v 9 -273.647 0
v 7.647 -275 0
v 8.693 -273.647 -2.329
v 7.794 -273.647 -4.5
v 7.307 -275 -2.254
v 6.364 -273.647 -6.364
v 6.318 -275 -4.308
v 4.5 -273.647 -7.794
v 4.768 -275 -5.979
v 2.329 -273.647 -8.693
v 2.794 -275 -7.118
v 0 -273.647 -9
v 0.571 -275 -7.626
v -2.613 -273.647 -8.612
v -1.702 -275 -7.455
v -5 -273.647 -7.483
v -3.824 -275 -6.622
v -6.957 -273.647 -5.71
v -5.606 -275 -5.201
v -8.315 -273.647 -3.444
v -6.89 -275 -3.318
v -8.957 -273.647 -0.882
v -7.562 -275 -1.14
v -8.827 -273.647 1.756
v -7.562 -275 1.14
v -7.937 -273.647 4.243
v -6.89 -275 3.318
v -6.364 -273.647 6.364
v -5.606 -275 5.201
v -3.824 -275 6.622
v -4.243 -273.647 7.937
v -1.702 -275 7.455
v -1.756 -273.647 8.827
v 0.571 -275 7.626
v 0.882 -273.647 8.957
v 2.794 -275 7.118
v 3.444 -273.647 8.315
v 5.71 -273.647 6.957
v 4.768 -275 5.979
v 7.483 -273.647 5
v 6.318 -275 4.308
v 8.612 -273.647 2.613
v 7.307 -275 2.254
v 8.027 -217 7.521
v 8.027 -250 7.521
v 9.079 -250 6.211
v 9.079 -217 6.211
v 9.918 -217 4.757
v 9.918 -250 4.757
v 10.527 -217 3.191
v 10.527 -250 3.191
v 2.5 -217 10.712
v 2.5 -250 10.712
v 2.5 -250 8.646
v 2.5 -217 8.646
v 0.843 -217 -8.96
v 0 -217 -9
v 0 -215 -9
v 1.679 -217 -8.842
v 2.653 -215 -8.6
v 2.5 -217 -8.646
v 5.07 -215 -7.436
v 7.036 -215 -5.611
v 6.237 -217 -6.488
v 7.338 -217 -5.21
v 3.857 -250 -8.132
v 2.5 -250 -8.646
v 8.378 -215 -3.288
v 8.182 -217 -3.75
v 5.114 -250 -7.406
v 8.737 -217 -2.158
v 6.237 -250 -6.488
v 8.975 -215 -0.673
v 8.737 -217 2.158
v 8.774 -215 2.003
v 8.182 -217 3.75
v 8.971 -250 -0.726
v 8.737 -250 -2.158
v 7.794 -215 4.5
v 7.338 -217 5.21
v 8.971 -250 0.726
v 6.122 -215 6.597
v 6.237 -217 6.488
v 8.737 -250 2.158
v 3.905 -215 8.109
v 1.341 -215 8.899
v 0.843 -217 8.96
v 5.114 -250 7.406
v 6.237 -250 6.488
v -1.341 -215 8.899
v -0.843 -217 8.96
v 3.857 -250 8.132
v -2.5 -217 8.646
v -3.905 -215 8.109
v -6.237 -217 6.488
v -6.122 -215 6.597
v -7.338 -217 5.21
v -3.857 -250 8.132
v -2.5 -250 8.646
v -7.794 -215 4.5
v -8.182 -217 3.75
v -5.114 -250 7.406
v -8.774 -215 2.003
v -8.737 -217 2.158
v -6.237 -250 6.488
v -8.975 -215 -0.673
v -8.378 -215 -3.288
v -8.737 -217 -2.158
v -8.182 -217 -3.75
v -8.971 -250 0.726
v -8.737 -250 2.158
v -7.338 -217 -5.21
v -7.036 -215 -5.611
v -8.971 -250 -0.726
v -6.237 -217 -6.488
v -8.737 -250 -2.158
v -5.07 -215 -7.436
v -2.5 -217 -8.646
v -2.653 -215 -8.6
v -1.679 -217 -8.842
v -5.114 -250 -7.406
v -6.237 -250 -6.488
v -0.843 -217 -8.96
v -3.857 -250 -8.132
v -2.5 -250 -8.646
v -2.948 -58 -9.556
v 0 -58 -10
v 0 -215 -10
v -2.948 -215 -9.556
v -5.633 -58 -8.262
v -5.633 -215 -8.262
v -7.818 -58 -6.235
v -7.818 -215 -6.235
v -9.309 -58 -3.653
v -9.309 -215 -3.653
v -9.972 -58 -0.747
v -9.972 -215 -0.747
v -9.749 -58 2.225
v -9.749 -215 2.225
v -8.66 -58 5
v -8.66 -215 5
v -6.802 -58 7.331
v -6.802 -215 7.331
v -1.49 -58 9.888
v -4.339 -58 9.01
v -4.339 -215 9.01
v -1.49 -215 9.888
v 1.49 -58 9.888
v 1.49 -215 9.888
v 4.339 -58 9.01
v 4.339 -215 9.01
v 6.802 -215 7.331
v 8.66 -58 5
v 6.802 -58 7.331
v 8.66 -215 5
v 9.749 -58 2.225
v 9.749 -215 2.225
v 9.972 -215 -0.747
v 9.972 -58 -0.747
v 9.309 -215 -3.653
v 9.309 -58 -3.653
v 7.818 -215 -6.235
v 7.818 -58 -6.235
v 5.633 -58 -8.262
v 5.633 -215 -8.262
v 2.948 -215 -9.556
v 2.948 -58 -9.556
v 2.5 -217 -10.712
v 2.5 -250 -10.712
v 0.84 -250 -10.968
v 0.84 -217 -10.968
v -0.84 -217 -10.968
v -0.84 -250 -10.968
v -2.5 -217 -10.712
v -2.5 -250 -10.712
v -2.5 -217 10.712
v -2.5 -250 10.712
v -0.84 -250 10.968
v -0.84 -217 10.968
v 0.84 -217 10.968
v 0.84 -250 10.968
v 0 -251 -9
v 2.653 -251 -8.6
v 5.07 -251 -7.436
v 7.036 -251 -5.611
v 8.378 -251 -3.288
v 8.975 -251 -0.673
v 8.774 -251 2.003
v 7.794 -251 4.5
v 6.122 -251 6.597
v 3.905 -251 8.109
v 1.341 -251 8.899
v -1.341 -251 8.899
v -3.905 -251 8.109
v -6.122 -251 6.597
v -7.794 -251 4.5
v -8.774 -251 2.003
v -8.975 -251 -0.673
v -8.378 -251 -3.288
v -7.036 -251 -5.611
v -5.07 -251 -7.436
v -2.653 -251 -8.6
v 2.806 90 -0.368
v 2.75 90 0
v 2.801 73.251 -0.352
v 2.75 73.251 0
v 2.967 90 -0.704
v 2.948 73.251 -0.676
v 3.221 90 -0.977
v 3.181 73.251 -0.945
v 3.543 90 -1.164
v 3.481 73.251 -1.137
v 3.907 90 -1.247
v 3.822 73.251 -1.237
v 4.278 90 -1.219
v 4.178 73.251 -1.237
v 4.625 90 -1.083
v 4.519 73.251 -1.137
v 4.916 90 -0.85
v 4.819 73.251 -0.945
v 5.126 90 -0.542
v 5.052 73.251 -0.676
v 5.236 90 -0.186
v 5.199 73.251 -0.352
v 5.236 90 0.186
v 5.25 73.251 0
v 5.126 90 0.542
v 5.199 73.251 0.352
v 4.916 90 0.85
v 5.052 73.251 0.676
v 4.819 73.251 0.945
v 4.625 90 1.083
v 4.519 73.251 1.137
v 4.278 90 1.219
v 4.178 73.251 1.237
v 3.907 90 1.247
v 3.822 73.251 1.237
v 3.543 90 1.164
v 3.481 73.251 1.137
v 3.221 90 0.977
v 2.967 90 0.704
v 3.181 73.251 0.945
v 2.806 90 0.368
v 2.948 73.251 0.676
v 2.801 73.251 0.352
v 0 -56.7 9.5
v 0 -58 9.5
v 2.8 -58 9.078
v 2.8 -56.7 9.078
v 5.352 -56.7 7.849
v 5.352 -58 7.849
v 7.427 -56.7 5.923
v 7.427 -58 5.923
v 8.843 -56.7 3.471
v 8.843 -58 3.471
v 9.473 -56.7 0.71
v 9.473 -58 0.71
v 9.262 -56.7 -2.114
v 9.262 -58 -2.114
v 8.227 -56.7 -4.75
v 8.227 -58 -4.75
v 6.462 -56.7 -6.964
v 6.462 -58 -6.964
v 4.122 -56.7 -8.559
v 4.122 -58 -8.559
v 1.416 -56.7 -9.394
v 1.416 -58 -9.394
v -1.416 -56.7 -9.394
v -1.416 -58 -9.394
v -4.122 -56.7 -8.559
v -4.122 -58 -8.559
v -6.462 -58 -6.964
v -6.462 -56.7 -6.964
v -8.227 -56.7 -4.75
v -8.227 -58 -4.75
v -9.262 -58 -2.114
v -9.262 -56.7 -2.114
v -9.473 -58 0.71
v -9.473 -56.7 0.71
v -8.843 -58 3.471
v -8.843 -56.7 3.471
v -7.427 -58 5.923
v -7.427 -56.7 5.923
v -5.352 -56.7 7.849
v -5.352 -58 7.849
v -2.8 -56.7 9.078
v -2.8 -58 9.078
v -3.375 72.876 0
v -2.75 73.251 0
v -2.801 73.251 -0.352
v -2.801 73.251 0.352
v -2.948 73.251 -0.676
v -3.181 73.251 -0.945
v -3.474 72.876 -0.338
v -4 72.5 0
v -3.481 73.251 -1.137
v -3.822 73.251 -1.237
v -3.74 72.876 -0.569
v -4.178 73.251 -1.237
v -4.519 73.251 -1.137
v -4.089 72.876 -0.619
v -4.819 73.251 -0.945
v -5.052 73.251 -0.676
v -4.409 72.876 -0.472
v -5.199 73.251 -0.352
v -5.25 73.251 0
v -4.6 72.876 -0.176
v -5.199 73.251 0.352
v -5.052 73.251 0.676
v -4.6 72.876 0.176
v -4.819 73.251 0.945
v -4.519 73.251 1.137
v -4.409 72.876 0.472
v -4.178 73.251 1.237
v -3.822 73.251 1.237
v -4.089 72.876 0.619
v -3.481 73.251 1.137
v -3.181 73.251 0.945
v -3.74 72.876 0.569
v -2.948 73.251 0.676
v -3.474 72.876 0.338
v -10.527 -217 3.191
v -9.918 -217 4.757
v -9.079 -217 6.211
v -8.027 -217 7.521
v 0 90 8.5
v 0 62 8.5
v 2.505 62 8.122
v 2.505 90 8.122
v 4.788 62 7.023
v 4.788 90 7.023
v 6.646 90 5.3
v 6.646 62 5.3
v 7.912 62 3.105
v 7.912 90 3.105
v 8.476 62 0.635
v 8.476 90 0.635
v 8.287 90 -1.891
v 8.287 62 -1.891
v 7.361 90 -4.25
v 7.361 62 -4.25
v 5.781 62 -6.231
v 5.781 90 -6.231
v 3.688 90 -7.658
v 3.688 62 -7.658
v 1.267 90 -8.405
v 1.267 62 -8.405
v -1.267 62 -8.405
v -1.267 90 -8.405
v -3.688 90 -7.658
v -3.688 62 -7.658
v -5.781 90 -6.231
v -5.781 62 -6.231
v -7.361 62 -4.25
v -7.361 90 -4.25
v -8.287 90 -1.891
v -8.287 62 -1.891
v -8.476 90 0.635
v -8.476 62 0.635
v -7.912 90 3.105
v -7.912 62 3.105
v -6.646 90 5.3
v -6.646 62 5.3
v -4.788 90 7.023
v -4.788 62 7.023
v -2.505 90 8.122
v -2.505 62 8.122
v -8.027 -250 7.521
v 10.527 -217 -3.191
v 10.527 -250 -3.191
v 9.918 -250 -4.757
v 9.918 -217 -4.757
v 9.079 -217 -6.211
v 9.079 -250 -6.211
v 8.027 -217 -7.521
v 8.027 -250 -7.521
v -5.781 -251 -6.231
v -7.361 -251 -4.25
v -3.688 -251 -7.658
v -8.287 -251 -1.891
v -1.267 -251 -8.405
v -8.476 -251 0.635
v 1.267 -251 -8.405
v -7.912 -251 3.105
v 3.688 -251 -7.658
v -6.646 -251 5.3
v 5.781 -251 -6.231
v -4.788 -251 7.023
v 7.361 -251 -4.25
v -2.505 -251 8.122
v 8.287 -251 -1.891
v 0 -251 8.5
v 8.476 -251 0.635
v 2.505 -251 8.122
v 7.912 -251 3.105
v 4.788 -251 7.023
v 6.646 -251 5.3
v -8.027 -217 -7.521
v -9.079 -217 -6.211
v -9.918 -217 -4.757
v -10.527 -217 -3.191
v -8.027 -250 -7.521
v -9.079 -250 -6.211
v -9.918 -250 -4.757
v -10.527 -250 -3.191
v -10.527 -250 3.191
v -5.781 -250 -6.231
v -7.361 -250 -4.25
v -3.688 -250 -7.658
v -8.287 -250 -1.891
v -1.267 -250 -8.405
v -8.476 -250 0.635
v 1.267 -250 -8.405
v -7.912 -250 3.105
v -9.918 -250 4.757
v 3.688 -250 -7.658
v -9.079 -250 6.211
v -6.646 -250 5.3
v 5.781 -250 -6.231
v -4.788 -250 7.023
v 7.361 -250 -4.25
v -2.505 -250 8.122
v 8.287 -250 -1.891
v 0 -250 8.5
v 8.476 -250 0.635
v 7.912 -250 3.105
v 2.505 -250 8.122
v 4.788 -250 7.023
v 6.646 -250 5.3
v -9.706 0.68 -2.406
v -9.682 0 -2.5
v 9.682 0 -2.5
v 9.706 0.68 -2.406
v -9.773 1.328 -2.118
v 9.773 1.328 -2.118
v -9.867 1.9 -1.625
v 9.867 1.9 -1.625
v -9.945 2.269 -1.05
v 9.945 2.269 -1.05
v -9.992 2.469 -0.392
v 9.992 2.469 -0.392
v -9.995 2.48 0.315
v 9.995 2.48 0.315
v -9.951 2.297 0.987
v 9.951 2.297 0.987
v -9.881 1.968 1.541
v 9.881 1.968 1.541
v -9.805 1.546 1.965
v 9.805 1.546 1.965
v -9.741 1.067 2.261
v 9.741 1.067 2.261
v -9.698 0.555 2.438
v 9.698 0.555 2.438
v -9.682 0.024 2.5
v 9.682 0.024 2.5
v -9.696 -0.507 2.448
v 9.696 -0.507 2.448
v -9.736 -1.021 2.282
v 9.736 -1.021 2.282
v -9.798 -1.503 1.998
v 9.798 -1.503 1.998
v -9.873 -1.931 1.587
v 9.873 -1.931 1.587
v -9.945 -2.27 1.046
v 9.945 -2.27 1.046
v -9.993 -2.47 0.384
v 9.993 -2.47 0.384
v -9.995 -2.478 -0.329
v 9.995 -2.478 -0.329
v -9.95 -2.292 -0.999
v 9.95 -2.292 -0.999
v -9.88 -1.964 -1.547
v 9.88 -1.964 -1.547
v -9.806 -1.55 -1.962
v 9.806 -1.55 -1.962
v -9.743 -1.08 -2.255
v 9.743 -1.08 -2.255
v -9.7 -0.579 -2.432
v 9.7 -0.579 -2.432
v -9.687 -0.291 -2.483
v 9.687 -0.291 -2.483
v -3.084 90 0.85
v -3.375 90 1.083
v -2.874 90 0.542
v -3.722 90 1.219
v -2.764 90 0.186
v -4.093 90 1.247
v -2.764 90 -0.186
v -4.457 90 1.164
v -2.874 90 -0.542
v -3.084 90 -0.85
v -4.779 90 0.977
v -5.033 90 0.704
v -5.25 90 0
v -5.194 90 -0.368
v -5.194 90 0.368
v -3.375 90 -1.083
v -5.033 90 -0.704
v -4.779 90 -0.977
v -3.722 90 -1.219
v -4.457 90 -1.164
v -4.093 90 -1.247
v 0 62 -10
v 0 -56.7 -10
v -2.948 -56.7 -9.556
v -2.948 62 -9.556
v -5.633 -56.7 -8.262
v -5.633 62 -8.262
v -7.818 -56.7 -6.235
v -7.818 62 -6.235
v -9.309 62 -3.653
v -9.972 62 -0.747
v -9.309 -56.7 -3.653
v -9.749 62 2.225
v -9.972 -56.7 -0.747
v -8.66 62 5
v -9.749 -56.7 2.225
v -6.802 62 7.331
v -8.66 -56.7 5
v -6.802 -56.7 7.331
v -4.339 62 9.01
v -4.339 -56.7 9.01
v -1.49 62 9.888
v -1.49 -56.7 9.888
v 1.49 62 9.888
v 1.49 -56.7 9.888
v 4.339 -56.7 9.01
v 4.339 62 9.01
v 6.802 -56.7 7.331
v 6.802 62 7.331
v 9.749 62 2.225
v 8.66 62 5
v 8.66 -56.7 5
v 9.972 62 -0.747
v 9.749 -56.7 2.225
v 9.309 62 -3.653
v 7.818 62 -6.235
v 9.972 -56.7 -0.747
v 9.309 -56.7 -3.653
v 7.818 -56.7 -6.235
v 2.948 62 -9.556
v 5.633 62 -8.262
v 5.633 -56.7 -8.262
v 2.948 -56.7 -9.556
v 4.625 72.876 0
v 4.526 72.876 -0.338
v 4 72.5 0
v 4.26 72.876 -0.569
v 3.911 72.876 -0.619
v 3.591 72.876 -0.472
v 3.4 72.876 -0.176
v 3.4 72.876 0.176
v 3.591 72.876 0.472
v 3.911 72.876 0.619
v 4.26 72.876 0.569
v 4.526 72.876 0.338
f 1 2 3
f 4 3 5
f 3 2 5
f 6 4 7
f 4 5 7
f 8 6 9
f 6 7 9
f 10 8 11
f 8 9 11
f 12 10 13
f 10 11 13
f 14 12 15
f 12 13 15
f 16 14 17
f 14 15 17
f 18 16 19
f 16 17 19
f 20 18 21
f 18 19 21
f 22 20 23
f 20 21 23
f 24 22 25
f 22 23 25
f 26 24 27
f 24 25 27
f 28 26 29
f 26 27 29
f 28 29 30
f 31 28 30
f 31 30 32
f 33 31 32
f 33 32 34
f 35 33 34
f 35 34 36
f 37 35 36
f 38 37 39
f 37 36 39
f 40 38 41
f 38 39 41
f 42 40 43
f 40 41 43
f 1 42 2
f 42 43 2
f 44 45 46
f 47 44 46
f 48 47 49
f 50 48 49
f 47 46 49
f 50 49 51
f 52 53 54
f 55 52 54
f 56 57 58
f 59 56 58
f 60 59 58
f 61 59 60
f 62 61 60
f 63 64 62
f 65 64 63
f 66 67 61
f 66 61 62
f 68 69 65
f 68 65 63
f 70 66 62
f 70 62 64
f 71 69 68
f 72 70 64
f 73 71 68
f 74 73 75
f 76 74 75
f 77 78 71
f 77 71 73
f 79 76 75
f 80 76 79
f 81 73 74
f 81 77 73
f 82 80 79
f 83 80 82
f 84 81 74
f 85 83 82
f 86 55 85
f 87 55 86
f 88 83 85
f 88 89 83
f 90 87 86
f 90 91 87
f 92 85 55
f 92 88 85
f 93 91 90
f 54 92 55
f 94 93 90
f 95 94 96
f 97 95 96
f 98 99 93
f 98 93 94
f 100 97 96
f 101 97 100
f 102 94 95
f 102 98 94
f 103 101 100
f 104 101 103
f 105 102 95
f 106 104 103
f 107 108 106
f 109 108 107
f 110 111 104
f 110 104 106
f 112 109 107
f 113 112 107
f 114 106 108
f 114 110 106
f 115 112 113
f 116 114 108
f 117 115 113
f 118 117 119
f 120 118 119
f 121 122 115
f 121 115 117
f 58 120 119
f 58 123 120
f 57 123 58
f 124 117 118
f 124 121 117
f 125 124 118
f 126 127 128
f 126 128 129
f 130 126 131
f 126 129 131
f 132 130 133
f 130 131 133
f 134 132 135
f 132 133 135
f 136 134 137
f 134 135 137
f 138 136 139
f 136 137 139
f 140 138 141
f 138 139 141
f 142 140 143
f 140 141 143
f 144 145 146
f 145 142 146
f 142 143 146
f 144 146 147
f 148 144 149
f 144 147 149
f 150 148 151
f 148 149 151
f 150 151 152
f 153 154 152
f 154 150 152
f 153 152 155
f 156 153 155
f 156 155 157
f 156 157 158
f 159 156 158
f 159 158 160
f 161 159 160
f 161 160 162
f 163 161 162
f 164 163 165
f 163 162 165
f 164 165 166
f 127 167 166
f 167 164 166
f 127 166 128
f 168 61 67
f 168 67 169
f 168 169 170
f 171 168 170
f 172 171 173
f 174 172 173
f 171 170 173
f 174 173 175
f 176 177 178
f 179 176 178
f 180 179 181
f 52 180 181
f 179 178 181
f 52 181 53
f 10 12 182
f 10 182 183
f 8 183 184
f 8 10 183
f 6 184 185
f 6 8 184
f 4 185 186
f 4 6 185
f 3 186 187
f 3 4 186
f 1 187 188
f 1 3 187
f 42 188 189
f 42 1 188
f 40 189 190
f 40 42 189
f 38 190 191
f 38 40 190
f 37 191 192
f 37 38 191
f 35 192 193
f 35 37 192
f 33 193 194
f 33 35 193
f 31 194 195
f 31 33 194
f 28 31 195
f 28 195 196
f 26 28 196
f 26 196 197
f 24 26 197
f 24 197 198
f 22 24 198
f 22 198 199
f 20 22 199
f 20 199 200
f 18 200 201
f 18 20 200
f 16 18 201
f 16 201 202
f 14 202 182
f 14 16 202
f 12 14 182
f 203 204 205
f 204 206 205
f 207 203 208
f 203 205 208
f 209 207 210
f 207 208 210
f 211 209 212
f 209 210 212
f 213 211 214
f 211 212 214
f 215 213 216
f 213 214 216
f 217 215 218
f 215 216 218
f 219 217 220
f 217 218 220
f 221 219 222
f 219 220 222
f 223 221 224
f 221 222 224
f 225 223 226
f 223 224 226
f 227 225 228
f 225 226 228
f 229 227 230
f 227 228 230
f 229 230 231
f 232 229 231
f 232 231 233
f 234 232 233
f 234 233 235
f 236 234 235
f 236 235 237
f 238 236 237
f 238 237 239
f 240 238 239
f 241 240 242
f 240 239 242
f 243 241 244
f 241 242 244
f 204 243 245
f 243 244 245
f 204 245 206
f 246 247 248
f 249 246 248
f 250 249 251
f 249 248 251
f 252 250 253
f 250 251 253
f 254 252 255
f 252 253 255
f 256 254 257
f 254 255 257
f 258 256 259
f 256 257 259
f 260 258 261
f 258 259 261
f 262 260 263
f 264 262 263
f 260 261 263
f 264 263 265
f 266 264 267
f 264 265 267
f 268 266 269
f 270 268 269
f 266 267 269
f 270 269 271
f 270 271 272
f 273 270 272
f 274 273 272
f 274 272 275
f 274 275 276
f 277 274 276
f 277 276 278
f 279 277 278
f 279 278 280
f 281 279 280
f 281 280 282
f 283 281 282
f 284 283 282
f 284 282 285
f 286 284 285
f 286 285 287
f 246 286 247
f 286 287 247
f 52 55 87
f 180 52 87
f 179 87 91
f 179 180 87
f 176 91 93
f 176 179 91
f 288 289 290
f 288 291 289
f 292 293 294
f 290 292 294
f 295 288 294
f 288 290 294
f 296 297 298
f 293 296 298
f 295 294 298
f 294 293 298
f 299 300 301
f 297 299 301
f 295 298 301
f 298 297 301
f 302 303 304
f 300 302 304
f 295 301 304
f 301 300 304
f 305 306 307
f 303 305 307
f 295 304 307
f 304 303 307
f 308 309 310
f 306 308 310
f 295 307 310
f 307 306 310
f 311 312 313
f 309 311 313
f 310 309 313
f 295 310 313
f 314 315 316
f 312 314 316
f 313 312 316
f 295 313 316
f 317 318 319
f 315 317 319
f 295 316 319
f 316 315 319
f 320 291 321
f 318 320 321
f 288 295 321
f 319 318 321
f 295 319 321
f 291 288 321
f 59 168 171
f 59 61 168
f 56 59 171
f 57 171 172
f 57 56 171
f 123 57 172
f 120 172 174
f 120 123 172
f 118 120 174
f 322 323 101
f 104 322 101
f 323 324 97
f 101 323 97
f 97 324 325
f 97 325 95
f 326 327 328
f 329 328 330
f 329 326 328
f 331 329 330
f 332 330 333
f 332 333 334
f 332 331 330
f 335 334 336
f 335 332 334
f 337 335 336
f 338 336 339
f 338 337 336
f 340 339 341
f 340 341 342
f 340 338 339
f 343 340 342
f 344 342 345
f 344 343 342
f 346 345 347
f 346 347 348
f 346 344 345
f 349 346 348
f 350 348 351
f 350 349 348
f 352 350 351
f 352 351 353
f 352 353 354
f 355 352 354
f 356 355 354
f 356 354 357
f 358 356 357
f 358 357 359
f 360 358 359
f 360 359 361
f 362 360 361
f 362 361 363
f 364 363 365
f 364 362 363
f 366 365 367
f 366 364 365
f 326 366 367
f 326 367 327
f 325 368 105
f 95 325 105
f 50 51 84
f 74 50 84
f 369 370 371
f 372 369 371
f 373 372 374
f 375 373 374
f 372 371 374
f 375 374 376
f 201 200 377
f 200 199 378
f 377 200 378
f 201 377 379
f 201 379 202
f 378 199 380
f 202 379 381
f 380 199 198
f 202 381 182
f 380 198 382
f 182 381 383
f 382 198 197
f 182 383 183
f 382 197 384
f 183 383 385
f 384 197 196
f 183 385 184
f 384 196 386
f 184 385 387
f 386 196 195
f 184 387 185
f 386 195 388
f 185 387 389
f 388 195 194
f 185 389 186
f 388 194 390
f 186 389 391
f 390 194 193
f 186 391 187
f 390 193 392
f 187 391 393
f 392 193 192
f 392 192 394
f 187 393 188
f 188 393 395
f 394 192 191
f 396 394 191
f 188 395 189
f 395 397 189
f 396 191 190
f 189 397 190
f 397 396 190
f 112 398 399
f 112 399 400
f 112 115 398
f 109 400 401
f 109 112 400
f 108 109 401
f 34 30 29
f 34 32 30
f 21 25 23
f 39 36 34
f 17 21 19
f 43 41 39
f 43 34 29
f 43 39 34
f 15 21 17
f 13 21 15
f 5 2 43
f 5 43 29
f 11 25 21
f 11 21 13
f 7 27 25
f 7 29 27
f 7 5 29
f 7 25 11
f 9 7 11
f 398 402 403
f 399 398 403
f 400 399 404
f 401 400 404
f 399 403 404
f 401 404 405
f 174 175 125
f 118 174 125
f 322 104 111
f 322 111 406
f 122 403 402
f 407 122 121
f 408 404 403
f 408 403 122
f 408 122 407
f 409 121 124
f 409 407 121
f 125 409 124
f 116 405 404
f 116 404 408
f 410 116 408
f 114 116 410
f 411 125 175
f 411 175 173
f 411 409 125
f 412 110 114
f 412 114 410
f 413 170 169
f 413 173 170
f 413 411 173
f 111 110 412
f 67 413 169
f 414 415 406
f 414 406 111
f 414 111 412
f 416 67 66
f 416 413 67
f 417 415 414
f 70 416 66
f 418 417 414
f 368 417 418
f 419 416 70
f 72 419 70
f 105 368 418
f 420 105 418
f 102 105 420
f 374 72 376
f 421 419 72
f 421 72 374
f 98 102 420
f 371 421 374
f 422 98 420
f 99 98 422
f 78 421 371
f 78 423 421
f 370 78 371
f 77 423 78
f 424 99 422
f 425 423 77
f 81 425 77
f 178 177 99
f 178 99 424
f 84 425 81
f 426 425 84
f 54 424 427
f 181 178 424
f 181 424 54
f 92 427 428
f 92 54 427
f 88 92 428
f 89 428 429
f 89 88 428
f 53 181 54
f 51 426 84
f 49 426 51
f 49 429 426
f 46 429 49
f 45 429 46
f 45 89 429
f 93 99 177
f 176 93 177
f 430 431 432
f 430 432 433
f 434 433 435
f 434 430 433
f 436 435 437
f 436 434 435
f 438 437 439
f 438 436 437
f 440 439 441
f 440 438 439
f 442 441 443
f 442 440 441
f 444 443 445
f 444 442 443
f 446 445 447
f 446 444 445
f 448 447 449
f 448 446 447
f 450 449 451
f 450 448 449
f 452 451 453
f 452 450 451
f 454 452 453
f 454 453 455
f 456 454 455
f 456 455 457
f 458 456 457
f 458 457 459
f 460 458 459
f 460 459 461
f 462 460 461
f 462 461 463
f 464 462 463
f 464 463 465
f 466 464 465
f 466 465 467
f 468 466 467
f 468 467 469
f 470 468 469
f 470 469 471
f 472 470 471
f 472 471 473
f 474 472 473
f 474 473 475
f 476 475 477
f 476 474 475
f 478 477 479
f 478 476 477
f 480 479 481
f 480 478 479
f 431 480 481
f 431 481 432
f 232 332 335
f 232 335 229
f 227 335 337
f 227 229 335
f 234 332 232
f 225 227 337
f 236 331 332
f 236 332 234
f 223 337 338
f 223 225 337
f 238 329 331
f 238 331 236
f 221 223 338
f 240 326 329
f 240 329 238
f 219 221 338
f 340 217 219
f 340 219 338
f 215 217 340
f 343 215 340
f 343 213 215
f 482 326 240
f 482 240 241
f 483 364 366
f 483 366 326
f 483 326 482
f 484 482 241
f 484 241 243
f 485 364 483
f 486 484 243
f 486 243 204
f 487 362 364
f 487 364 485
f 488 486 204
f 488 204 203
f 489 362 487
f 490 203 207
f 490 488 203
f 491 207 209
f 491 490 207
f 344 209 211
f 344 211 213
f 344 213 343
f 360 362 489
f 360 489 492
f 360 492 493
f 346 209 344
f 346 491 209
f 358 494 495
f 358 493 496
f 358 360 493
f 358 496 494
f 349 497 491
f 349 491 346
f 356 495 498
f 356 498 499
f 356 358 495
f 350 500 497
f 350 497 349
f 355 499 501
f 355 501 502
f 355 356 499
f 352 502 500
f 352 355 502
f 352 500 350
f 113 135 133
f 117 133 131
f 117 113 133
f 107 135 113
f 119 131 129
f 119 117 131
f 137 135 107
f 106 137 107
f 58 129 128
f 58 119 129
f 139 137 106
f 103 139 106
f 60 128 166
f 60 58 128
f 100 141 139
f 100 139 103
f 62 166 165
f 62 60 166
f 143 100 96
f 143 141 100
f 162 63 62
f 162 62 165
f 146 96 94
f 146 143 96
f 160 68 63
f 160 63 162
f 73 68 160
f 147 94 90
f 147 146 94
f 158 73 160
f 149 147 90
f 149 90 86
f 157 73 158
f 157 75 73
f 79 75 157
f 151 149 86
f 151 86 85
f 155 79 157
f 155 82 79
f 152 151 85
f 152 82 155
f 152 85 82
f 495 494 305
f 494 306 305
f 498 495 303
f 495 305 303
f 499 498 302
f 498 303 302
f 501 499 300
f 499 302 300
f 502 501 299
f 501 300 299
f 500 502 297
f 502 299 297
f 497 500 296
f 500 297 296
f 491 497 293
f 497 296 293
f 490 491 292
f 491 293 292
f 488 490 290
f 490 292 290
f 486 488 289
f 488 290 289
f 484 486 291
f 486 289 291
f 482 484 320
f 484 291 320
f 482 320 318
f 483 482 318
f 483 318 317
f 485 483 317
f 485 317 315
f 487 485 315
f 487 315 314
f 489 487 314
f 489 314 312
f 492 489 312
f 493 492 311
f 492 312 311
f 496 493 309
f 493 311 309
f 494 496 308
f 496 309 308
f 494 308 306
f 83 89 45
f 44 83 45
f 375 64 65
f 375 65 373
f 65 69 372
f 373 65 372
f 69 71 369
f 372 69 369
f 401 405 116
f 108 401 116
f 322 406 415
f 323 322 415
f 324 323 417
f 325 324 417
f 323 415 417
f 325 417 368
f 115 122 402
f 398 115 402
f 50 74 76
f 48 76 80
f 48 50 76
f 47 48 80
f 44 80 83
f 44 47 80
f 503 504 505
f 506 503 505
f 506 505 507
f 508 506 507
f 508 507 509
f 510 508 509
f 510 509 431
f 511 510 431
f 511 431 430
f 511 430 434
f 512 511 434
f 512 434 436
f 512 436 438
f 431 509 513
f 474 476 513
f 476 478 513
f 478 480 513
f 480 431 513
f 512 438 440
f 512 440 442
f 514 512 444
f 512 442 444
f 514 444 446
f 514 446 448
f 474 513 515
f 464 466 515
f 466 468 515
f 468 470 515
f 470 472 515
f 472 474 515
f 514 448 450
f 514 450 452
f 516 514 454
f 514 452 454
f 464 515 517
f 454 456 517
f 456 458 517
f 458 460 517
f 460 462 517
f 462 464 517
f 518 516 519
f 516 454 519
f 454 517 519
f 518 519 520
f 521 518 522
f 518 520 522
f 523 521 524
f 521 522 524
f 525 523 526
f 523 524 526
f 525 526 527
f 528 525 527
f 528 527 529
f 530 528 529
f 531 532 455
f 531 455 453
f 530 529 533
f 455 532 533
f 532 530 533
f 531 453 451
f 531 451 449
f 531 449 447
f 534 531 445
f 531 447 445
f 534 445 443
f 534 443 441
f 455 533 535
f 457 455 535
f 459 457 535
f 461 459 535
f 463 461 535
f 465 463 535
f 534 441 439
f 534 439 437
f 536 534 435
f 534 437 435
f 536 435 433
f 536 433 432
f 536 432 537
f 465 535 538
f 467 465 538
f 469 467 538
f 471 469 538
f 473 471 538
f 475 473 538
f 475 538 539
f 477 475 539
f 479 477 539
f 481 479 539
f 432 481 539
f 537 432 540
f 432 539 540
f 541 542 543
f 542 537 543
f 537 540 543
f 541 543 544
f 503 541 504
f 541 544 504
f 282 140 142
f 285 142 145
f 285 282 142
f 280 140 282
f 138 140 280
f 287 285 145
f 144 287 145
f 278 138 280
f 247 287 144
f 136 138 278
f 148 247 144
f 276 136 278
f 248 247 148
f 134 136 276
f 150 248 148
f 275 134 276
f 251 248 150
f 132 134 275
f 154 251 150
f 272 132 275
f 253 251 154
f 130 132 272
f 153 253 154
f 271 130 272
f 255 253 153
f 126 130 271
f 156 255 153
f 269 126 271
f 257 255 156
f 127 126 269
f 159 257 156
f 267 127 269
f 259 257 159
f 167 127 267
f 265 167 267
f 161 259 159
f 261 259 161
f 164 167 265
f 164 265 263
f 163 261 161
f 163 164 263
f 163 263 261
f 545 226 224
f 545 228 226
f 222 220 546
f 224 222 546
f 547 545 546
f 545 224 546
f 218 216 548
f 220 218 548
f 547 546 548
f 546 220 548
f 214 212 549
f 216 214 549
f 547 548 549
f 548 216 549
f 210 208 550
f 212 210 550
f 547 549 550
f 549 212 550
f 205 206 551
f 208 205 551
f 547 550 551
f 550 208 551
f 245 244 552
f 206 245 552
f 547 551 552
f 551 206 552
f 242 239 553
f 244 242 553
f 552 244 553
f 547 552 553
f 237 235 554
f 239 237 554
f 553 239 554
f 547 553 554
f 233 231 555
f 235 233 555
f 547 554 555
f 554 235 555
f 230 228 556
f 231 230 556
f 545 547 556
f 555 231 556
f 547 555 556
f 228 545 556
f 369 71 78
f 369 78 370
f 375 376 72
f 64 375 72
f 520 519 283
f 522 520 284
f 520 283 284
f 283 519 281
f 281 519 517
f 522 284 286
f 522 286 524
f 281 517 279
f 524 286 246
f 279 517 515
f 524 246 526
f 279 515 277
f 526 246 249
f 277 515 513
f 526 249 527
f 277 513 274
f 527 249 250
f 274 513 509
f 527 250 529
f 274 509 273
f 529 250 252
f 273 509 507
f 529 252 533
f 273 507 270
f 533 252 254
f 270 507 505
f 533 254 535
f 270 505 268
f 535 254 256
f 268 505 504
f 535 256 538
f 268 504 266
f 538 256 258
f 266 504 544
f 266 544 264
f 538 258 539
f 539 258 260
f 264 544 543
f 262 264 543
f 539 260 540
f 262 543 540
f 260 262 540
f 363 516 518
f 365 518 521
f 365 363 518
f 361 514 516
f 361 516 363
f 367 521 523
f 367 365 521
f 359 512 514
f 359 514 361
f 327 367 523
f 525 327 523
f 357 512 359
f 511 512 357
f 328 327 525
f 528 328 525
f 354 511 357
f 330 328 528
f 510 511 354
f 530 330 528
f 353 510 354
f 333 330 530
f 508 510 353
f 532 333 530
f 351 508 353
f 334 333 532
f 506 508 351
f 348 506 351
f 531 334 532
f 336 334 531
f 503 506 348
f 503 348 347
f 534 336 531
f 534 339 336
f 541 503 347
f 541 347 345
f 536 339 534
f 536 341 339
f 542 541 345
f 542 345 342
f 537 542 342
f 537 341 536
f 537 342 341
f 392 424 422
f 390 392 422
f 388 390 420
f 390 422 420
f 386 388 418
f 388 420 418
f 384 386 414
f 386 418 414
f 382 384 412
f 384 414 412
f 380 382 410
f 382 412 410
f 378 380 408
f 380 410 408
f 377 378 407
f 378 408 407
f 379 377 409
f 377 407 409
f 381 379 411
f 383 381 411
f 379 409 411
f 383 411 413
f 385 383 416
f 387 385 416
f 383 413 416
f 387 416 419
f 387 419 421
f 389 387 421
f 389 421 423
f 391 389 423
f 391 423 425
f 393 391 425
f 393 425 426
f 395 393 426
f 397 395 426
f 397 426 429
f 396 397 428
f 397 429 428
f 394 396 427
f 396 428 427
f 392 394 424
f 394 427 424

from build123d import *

# Parameters (mm, degrees)
EXTRUDE_1_DEPTH          = 90
EXTRUDE_1_DEPTH_BACK     = 250
SKETCH_1_R               = 10
CUT_EXTRUDE_1_DEPTH      = 251.399680511
CUT_EXTRUDE_1_DEPTH_BACK = 251.399680511
SKETCH_2_R               = 2.5
CHAMFER_1_SIZE           = 1
CUT_EXTRUDE_START        = -58
SKETCH_3_OUTSIDE_W       = 90.234
SKETCH_3_OUTSIDE_H       = 90.234
SKETCH_3_OUTSIDE_R       = 9.5
CUT_EXTRUDE_2_DEPTH      = 1.3
SKETCH_4_OUTSIDE_W       = 90.234
SKETCH_4_OUTSIDE_H       = 90.234
SKETCH_4_OUTSIDE_R       = 8.5
CUT_EXTRUDE_3_DEPTH      = 28
HOLE_WIZARD_M3_1_D       = 2.5
HOLE_WIZARD_M3_1_DEPTH   = 16.748924226
HOLE_WIZARD_M3_1_TIP     = 0.751075774
SKETCH_12_OUTSIDE_W      = 90.234
SKETCH_12_OUTSIDE_H      = 90.234
SKETCH_12_OUTSIDE_R      = 9
CUT_EXTRUDE_4_DEPTH      = 33
EXTRUDE_2_DEPTH          = 33
PATTERN_CIRCULAR_1_COUNT = 6
SKETCH_14_OUTSIDE_W      = 91.326
SKETCH_14_OUTSIDE_H      = 92.272
SKETCH_14_OUTSIDE_R      = 9
CUT_EXTRUDE_5_DEPTH      = 2
EXTRUDE_START            = 25
SKETCH_15_R              = 9
EXTRUDE_3_DEPTH          = 25
CUT_EXTRUDE_START_2      = -25
SKETCH_16_OUTSIDE_W      = 96.308
SKETCH_16_OUTSIDE_H      = 97.254
SKETCH_16_OUTSIDE_R      = 8.5
CUT_EXTRUDE_6_DEPTH      = 1


# Read off the part's stored shape, not the designer's step: M18 机械螺纹 螺柱1
with BuildPart() as part:
    # 草图1 → 凸台-拉伸1 (new, two sides: drawn at the far end of the back side and taken through both)
    with BuildSketch(Plane(origin=(0, 0, 0), x_dir=(1, 0, 0), z_dir=(0, 1, 0)).offset(-EXTRUDE_1_DEPTH_BACK)):
        with Locations(Location((0, 0, 0), (0, 0, 90))):
            Circle(SKETCH_1_R)
    extrude(amount=EXTRUDE_1_DEPTH + EXTRUDE_1_DEPTH_BACK)

    # 草图2 → 切除-拉伸1 (cut, two sides: drawn at the far end of the back side and taken through both)
    with BuildSketch(Plane(origin=(0, 0, 0), x_dir=(0, 0, -1), z_dir=(1, 0, 0)).offset(-CUT_EXTRUDE_1_DEPTH_BACK)):
        Circle(SKETCH_2_R)
    extrude(amount=CUT_EXTRUDE_1_DEPTH + CUT_EXTRUDE_1_DEPTH_BACK, mode=Mode.SUBTRACT)

    # 倒角1
    chamfer_1_edges = [part.edges().sort_by_distance(p)[0] for p in [
        (0, 90, 10),
    ]]
    chamfer(chamfer_1_edges, length=CHAMFER_1_SIZE)

    # 草图3 outside → 切除-拉伸2 (cut)
    with BuildSketch(Plane(origin=(0, 0, 0), x_dir=(1, 0, 0), z_dir=(0, 1, 0)).offset(CUT_EXTRUDE_START)):
        Rectangle(SKETCH_3_OUTSIDE_W, SKETCH_3_OUTSIDE_H)
        with Locations(Location((0, 0, 0), (0, 0, 270))):
            Circle(SKETCH_3_OUTSIDE_R, mode=Mode.SUBTRACT)
    extrude(amount=CUT_EXTRUDE_2_DEPTH, mode=Mode.SUBTRACT)

    # 草图4 outside → 切除-拉伸3 (cut)
    with BuildSketch(Plane(origin=(0, 90, 0), x_dir=(1, 0, 0), z_dir=(0, 1, 0))):
        Rectangle(SKETCH_4_OUTSIDE_W, SKETCH_4_OUTSIDE_H)
        with Locations(Location((0, 0, 0), (0, 0, 270))):
            Circle(SKETCH_4_OUTSIDE_R, mode=Mode.SUBTRACT)
    extrude(amount=-CUT_EXTRUDE_3_DEPTH, mode=Mode.SUBTRACT)

    # M3 螺纹孔1
    with Locations(Plane(origin=(0, 90, 0), x_dir=(1, 0, 0), z_dir=(0, 1, 0))):
        with Locations((4, 0), (-4, 0)):
            Hole(HOLE_WIZARD_M3_1_D / 2, depth=HOLE_WIZARD_M3_1_DEPTH)
            with Locations((0, 0, -(HOLE_WIZARD_M3_1_DEPTH + HOLE_WIZARD_M3_1_TIP / 2))):  # 118° drill point
                Cone(0, HOLE_WIZARD_M3_1_D / 2, HOLE_WIZARD_M3_1_TIP, mode=Mode.SUBTRACT)

    # 草图12 outside → 切除-拉伸4 (cut)
    with BuildSketch(Plane.XZ.offset(250)):
        Rectangle(SKETCH_12_OUTSIDE_W, SKETCH_12_OUTSIDE_H)
        with Locations(Location((0, 0, 0), (0, 0, 270))):
            Circle(SKETCH_12_OUTSIDE_R, mode=Mode.SUBTRACT)
    extrude(amount=-CUT_EXTRUDE_4_DEPTH, mode=Mode.SUBTRACT)

    # 草图13 → 凸台-拉伸2 (add)
    with BuildSketch(Plane.XZ.offset(250)):
        with BuildLine():
            Line((-2.5, -10.712142643), (-2.5, 10.712142643))
            ThreePointArc((-2.5, 10.712142643), (0, 11), (2.5, 10.712142643))
            Line((2.5, 10.712142643), (2.5, -10.712142643))
            ThreePointArc((2.5, -10.712142643), (0, -11), (-2.5, -10.712142643))
        make_face()
    extrude_2 = extrude(amount=-EXTRUDE_2_DEPTH)

    # 阵列(圆周)1: 凸台-拉伸2 ×6 about axis
    pattern_circular_1_axis = Axis((0, 0, 0), (0, 1, 0))
    for i in range(1, PATTERN_CIRCULAR_1_COUNT):
        add(extrude_2.rotate(pattern_circular_1_axis, i * 360 / PATTERN_CIRCULAR_1_COUNT))

    # 草图14 outside → 切除-拉伸5 (cut)
    with BuildSketch(Plane.XZ.offset(217)):
        Rectangle(SKETCH_14_OUTSIDE_W, SKETCH_14_OUTSIDE_H)
        with Locations(Location((0, 0, 0), (0, 0, 270))):
            Circle(SKETCH_14_OUTSIDE_R, mode=Mode.SUBTRACT)
    extrude(amount=-CUT_EXTRUDE_5_DEPTH, mode=Mode.SUBTRACT)

    # 草图15 → 凸台-拉伸3 (add)
    with BuildSketch(Plane.XZ.offset(250).offset(EXTRUDE_START)):
        with Locations(Location((0, 0, 0), (0, 0, 270))):
            Circle(SKETCH_15_R)
    extrude(amount=-EXTRUDE_3_DEPTH)

    # 草图16 outside → 切除-拉伸6 (cut)
    with BuildSketch(Plane.XZ.offset(275).offset(CUT_EXTRUDE_START_2)):
        Rectangle(SKETCH_16_OUTSIDE_W, SKETCH_16_OUTSIDE_H)
        with Locations(Location((0, 0, 0), (0, 0, 90))):
            Circle(SKETCH_16_OUTSIDE_R, mode=Mode.SUBTRACT)
    extrude(amount=CUT_EXTRUDE_6_DEPTH, mode=Mode.SUBTRACT)

    # M18 机械螺纹 螺柱1 outline → M18 机械螺纹 螺柱1 (revolve, cut)
    with BuildSketch(Plane.XY):
        Polygon((9, -273.647), (7.647, -275), (9, -275), align=None)
    revolve(axis=Axis((0, 0, 0), (0, 1, 0)), mode=Mode.SUBTRACT)


solid = part.part
